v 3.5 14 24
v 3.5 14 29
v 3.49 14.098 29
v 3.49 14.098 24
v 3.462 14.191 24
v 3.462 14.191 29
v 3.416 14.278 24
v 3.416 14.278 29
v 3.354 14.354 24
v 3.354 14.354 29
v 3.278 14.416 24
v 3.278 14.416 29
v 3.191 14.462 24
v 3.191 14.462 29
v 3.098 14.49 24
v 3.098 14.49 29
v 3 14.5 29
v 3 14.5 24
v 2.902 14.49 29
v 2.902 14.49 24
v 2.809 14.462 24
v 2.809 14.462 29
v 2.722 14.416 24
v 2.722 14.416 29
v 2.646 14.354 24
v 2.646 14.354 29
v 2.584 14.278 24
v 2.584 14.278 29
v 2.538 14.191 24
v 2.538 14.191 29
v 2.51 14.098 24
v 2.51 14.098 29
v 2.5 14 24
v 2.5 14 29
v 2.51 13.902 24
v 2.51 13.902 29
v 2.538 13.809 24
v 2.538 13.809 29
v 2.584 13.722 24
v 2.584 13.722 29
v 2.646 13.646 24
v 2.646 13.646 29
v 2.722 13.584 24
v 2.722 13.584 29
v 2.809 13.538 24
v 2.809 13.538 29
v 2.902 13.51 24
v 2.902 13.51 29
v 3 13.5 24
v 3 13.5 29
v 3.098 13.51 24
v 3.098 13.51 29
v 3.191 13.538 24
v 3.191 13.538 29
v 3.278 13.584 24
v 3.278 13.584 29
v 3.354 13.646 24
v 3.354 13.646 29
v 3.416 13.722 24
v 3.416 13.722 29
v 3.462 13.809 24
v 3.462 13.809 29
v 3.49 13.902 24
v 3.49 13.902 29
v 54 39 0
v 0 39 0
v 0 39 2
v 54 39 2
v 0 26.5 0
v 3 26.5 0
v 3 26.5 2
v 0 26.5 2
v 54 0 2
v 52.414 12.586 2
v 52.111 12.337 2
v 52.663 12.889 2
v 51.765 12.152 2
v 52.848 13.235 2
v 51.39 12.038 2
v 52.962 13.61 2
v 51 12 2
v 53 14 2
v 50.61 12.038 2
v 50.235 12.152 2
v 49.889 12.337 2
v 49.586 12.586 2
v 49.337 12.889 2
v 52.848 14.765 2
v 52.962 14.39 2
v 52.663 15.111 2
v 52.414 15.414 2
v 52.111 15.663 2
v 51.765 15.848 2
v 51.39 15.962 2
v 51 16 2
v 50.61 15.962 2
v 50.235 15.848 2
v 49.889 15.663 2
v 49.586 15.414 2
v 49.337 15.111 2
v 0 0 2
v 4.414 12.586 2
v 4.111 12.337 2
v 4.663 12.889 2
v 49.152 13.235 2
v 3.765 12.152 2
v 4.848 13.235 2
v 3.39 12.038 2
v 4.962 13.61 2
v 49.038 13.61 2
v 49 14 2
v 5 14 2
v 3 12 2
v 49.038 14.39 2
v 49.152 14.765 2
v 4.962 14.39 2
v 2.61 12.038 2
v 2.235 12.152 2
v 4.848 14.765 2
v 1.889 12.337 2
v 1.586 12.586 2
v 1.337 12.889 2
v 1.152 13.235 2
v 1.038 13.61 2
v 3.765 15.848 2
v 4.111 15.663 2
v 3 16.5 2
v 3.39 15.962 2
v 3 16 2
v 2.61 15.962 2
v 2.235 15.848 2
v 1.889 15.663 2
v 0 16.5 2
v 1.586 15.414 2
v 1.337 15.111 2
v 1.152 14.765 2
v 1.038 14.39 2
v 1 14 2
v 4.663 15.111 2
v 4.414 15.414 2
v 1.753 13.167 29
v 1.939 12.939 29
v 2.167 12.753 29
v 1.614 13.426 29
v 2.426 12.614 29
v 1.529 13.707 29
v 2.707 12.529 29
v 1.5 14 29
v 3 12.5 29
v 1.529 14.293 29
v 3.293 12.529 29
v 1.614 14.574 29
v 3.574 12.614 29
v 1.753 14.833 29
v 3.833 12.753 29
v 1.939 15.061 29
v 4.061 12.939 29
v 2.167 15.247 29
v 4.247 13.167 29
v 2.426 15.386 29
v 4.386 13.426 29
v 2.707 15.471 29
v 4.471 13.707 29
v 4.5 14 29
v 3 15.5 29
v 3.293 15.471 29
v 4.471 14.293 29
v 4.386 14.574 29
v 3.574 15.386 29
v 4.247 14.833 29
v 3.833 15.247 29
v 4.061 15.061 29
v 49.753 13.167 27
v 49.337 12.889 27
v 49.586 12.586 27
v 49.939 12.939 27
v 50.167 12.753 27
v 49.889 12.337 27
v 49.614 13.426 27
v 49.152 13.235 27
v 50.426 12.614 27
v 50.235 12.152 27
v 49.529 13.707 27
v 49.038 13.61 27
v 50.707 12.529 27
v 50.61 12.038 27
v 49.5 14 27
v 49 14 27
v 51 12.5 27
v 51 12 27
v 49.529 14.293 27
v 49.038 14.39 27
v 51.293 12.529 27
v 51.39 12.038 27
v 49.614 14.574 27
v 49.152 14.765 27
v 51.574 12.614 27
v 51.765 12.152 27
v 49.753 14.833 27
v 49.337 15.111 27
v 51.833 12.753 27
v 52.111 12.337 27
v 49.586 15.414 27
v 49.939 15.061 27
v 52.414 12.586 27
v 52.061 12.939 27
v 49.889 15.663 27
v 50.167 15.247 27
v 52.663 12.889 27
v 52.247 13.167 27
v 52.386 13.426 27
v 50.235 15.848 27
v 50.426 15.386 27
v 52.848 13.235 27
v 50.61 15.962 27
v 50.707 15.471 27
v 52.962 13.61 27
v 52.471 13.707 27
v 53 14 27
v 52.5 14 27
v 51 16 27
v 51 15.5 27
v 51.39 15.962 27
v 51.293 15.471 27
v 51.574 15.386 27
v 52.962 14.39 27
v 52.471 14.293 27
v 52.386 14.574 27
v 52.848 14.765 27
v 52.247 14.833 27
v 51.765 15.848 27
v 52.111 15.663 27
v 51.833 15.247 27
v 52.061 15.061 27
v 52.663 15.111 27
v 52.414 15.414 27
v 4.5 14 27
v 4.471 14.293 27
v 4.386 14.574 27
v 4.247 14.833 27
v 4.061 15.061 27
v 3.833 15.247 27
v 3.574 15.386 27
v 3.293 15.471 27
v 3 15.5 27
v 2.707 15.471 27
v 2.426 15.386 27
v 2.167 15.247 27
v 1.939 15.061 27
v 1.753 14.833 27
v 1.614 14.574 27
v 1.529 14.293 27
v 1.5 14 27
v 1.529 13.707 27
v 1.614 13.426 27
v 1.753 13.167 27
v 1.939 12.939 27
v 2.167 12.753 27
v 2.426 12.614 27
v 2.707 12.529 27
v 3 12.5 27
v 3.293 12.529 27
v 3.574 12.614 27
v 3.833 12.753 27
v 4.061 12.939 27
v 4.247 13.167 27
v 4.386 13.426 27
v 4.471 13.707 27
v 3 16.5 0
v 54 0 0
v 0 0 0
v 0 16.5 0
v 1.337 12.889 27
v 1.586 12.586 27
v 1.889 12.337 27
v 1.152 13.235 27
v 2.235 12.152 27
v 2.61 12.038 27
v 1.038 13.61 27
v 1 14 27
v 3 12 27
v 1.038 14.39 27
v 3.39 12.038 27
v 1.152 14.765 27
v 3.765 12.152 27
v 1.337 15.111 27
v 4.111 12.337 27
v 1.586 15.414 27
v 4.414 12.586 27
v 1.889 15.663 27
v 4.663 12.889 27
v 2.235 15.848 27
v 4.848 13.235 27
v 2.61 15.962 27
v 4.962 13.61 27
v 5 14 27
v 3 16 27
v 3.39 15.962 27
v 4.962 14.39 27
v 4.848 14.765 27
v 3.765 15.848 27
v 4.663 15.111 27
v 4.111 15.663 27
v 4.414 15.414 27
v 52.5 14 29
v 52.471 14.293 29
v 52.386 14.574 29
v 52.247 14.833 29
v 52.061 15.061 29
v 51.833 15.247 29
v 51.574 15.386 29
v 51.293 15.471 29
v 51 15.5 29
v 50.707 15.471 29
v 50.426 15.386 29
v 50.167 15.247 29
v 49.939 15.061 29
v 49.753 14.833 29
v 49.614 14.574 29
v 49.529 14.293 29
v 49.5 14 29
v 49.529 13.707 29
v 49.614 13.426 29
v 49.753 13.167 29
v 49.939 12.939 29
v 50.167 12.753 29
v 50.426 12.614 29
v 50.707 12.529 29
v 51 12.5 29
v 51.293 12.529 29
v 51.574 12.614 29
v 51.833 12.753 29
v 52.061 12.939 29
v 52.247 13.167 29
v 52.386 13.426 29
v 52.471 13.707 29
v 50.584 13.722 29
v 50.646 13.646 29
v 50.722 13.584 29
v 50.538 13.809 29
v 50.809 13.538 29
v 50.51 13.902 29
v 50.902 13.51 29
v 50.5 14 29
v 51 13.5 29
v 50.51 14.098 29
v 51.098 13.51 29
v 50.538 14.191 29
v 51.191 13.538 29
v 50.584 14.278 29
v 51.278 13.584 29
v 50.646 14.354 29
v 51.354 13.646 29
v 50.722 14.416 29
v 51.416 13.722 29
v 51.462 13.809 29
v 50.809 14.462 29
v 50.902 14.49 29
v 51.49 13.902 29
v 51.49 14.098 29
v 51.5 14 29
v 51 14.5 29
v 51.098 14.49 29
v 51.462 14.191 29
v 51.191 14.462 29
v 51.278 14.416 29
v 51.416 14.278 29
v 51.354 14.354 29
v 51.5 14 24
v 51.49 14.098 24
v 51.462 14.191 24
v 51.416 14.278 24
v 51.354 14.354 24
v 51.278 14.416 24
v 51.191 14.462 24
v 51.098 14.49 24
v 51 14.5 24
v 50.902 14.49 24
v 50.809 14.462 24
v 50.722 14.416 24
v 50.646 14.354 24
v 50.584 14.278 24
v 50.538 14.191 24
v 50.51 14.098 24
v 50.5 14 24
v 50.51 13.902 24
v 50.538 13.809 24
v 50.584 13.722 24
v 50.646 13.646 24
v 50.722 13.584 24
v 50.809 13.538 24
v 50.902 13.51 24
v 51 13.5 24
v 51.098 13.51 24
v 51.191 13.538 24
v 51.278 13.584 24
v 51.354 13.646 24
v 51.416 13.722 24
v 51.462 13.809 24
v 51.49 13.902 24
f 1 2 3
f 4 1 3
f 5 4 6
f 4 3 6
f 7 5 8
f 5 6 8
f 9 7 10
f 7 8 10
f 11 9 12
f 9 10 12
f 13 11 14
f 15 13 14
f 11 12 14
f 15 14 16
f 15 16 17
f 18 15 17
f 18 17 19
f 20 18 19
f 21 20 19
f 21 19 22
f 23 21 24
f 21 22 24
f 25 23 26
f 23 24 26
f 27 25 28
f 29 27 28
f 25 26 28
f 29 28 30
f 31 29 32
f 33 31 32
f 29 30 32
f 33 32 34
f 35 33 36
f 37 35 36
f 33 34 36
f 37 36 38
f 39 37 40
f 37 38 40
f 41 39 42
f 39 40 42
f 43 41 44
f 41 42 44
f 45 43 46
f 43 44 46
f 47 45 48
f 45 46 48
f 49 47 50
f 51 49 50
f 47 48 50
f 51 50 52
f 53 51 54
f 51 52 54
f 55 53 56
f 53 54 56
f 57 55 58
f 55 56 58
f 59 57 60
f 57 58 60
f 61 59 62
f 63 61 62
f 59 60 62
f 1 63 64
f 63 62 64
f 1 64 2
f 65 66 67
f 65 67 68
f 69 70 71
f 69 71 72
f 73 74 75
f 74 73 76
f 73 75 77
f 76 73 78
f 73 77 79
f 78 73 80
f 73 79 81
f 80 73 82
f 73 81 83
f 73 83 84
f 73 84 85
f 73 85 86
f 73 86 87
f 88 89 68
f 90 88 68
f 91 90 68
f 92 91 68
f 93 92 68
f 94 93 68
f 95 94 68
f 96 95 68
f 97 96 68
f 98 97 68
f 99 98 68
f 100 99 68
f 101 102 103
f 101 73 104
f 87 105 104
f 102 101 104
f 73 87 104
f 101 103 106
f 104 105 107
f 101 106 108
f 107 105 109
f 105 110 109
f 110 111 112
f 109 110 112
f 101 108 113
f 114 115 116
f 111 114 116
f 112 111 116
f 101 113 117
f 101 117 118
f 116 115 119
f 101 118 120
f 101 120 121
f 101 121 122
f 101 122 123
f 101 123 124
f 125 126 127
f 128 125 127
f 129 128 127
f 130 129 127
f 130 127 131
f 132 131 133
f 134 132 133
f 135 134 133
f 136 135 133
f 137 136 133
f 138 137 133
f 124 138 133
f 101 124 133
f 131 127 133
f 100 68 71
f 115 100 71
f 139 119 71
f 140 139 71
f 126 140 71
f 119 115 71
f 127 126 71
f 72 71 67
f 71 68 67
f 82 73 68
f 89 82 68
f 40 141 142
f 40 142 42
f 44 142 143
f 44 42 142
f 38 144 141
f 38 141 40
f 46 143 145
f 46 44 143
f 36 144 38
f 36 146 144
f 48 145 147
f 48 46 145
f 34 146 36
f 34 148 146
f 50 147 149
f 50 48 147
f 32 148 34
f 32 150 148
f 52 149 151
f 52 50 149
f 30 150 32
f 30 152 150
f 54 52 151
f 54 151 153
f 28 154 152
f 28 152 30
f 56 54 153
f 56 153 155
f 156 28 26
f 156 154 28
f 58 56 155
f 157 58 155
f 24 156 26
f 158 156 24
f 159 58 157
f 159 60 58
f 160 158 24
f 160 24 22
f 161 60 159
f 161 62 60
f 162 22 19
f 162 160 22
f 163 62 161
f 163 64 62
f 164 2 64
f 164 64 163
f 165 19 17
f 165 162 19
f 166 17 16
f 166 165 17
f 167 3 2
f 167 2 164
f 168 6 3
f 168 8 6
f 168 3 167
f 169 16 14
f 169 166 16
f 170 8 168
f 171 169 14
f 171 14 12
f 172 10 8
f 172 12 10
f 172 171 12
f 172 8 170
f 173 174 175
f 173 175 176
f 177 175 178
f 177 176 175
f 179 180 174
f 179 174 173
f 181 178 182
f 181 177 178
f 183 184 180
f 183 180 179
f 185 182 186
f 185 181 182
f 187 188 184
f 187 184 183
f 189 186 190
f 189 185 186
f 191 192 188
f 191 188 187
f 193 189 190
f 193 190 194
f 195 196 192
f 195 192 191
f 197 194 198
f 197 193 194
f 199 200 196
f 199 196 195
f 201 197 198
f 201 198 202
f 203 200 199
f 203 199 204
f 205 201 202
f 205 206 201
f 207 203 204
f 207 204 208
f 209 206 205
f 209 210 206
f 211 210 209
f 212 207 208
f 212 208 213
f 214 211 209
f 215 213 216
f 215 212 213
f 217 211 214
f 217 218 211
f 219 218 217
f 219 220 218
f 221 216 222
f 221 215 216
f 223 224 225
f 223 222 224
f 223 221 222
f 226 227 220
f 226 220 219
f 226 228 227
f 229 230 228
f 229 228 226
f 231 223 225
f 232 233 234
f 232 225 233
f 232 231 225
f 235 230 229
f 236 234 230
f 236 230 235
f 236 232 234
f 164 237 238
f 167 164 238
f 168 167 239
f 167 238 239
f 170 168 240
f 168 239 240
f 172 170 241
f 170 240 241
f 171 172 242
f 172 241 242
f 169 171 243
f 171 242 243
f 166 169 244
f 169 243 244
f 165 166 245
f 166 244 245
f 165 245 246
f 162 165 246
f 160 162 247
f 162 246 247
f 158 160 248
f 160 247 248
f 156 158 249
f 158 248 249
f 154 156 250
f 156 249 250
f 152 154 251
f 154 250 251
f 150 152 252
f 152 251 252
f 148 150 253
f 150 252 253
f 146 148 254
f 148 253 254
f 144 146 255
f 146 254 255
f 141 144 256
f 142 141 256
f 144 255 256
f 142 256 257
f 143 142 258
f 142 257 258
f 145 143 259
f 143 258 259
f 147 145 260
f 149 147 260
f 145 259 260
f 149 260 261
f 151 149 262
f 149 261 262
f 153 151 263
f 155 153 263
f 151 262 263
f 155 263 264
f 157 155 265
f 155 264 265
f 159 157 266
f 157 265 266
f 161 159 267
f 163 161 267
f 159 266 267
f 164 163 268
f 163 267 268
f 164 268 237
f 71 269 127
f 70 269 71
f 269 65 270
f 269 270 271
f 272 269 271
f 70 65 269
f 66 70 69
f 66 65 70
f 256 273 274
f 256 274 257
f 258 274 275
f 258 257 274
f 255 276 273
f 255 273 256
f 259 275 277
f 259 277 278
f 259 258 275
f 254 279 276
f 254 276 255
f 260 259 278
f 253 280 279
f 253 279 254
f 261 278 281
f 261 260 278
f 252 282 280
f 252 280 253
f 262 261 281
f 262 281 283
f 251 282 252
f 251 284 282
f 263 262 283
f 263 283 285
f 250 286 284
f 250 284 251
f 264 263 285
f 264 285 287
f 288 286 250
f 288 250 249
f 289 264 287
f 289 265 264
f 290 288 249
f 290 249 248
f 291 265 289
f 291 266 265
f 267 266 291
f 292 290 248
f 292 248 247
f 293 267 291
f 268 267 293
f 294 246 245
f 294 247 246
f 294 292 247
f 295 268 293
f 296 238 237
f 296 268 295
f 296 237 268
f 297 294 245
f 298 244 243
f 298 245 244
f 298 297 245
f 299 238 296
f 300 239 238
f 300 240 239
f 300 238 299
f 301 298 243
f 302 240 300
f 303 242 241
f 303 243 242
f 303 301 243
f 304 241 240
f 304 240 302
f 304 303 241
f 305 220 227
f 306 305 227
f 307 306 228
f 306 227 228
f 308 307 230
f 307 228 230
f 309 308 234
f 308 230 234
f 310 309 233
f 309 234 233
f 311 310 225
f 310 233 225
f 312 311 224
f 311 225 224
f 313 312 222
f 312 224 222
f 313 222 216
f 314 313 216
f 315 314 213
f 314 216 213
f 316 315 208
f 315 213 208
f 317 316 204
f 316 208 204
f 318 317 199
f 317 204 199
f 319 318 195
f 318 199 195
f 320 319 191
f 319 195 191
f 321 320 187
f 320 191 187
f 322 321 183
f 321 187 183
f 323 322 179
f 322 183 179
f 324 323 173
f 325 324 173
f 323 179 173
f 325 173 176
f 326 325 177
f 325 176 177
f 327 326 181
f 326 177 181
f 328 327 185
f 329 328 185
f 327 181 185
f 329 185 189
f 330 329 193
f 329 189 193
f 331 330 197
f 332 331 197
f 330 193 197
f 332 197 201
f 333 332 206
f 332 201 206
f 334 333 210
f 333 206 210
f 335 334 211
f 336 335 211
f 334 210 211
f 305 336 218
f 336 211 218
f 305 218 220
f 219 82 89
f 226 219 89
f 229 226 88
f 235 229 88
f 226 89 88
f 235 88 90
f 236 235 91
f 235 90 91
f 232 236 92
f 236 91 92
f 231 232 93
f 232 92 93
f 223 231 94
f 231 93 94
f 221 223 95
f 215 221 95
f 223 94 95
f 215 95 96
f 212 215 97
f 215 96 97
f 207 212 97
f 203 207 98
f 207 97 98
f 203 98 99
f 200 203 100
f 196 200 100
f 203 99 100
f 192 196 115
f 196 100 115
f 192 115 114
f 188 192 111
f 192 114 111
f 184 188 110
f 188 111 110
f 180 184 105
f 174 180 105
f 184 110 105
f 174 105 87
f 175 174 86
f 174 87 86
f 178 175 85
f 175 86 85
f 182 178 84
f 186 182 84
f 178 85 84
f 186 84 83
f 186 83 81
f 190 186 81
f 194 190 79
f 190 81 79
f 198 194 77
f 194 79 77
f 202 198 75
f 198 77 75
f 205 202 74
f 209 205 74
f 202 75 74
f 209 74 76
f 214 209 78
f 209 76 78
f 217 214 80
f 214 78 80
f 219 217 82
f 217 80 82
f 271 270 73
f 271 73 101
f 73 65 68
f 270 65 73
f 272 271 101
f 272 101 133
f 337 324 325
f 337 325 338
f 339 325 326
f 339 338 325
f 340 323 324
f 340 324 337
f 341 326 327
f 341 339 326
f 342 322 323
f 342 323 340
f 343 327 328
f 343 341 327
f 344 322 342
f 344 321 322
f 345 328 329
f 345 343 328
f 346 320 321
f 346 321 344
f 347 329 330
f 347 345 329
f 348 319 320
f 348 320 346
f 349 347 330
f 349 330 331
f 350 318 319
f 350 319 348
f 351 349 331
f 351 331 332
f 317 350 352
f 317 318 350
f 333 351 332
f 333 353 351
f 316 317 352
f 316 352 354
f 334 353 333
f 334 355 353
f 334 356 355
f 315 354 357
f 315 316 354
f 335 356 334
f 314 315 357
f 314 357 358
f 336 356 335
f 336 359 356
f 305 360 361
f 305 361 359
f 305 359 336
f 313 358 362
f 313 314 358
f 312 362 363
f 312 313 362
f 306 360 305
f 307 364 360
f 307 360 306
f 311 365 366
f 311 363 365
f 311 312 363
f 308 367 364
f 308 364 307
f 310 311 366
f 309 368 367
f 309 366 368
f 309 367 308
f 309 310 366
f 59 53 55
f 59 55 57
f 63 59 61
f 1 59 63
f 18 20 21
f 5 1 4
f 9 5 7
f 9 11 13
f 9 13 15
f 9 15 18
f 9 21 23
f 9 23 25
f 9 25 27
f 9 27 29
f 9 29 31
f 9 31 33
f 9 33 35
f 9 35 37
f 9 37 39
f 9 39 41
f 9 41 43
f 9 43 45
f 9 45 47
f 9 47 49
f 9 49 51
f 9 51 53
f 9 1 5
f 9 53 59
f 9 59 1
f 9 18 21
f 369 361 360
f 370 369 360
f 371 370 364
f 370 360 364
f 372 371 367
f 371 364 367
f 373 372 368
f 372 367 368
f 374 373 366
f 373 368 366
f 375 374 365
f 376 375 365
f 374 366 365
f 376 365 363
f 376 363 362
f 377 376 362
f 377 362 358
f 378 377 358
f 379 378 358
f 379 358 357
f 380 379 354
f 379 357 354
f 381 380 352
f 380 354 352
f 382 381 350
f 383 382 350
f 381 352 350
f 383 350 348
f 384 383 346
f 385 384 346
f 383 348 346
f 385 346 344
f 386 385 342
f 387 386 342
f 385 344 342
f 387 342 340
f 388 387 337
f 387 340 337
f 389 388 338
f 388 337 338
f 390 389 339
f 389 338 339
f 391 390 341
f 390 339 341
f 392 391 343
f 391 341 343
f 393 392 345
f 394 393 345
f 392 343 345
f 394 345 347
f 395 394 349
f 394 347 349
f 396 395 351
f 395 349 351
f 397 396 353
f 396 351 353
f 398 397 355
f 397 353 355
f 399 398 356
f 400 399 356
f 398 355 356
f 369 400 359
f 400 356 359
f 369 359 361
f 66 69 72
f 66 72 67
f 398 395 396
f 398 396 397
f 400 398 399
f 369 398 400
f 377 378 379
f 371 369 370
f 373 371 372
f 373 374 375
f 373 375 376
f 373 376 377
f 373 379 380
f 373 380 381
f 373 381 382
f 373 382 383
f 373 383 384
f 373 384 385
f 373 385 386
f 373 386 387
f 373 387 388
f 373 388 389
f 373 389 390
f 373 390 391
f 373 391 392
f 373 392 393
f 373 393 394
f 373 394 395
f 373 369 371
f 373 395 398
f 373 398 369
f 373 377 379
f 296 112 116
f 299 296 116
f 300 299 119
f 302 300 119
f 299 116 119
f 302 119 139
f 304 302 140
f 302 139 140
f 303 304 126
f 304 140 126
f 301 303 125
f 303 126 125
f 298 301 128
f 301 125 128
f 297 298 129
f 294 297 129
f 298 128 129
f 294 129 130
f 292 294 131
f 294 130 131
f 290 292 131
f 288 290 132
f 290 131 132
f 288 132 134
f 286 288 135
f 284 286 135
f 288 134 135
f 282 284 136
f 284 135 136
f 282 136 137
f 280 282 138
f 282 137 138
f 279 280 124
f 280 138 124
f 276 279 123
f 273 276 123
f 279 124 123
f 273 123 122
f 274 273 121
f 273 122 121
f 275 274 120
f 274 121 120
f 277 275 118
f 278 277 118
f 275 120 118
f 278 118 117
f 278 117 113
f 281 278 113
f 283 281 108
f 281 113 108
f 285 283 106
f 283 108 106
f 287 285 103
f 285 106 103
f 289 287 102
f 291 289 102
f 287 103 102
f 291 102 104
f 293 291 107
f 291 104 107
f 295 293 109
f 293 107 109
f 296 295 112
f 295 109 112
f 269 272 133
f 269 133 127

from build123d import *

# Parameters (mm, degrees)
PAD_DEPTH       = 2
SKETCH001_R     = 2
PAD001_DEPTH    = 25
SKETCH002_R     = 1.5
PAD002_DEPTH    = 2
SKETCH003_R     = 1.5
PAD003_DEPTH    = 2
SKETCH004_R     = 0.5
POCKET_DEPTH    = 5
SKETCH005_R     = 0.5
POCKET001_DEPTH = 5


with BuildPart() as part:
    # Sketch → Pad (new body)
    with BuildSketch(Plane.XY):
        Polygon((0, 39), (54, 39), (54, 0), (0, 0), (0, 16.5), (3, 16.5), (3, 26.5), (0, 26.5), align=None)
    extrude(amount=PAD_DEPTH)

    # Sketch001 (on Face10 of Pad) → Pad001 (join)
    with BuildSketch(Plane.XY.offset(2)):
        with Locations((3, 14)):
            Circle(SKETCH001_R)
        with Locations((51, 14)):
            Circle(SKETCH001_R)
    extrude(amount=PAD001_DEPTH)

    # Sketch002 (on Face13 of Pad001) → Pad002 (join)
    with BuildSketch(Plane.XY.offset(27)):
        with Locations((3, 14)):
            Circle(SKETCH002_R)
    extrude(amount=PAD002_DEPTH)

    # Sketch003 (on Face14 of Pad002) → Pad003 (join)
    with BuildSketch(Plane.XY.offset(27)):
        with Locations((51, 14)):
            Circle(SKETCH003_R)
    extrude(amount=PAD003_DEPTH)

    # Sketch004 (on Face17 of Pad003) → Pocket (cut)
    with BuildSketch(Plane.XY.offset(29)):
        with Locations((3, 14)):
            Circle(SKETCH004_R)
    extrude(amount=-POCKET_DEPTH, mode=Mode.SUBTRACT)

    # Sketch005 (on Face18 of Pocket) → Pocket001 (cut)
    with BuildSketch(Plane.XY.offset(29)):
        with Locations((51, 14)):
            Circle(SKETCH005_R)
    extrude(amount=-POCKET001_DEPTH, mode=Mode.SUBTRACT)


solid = part.part
